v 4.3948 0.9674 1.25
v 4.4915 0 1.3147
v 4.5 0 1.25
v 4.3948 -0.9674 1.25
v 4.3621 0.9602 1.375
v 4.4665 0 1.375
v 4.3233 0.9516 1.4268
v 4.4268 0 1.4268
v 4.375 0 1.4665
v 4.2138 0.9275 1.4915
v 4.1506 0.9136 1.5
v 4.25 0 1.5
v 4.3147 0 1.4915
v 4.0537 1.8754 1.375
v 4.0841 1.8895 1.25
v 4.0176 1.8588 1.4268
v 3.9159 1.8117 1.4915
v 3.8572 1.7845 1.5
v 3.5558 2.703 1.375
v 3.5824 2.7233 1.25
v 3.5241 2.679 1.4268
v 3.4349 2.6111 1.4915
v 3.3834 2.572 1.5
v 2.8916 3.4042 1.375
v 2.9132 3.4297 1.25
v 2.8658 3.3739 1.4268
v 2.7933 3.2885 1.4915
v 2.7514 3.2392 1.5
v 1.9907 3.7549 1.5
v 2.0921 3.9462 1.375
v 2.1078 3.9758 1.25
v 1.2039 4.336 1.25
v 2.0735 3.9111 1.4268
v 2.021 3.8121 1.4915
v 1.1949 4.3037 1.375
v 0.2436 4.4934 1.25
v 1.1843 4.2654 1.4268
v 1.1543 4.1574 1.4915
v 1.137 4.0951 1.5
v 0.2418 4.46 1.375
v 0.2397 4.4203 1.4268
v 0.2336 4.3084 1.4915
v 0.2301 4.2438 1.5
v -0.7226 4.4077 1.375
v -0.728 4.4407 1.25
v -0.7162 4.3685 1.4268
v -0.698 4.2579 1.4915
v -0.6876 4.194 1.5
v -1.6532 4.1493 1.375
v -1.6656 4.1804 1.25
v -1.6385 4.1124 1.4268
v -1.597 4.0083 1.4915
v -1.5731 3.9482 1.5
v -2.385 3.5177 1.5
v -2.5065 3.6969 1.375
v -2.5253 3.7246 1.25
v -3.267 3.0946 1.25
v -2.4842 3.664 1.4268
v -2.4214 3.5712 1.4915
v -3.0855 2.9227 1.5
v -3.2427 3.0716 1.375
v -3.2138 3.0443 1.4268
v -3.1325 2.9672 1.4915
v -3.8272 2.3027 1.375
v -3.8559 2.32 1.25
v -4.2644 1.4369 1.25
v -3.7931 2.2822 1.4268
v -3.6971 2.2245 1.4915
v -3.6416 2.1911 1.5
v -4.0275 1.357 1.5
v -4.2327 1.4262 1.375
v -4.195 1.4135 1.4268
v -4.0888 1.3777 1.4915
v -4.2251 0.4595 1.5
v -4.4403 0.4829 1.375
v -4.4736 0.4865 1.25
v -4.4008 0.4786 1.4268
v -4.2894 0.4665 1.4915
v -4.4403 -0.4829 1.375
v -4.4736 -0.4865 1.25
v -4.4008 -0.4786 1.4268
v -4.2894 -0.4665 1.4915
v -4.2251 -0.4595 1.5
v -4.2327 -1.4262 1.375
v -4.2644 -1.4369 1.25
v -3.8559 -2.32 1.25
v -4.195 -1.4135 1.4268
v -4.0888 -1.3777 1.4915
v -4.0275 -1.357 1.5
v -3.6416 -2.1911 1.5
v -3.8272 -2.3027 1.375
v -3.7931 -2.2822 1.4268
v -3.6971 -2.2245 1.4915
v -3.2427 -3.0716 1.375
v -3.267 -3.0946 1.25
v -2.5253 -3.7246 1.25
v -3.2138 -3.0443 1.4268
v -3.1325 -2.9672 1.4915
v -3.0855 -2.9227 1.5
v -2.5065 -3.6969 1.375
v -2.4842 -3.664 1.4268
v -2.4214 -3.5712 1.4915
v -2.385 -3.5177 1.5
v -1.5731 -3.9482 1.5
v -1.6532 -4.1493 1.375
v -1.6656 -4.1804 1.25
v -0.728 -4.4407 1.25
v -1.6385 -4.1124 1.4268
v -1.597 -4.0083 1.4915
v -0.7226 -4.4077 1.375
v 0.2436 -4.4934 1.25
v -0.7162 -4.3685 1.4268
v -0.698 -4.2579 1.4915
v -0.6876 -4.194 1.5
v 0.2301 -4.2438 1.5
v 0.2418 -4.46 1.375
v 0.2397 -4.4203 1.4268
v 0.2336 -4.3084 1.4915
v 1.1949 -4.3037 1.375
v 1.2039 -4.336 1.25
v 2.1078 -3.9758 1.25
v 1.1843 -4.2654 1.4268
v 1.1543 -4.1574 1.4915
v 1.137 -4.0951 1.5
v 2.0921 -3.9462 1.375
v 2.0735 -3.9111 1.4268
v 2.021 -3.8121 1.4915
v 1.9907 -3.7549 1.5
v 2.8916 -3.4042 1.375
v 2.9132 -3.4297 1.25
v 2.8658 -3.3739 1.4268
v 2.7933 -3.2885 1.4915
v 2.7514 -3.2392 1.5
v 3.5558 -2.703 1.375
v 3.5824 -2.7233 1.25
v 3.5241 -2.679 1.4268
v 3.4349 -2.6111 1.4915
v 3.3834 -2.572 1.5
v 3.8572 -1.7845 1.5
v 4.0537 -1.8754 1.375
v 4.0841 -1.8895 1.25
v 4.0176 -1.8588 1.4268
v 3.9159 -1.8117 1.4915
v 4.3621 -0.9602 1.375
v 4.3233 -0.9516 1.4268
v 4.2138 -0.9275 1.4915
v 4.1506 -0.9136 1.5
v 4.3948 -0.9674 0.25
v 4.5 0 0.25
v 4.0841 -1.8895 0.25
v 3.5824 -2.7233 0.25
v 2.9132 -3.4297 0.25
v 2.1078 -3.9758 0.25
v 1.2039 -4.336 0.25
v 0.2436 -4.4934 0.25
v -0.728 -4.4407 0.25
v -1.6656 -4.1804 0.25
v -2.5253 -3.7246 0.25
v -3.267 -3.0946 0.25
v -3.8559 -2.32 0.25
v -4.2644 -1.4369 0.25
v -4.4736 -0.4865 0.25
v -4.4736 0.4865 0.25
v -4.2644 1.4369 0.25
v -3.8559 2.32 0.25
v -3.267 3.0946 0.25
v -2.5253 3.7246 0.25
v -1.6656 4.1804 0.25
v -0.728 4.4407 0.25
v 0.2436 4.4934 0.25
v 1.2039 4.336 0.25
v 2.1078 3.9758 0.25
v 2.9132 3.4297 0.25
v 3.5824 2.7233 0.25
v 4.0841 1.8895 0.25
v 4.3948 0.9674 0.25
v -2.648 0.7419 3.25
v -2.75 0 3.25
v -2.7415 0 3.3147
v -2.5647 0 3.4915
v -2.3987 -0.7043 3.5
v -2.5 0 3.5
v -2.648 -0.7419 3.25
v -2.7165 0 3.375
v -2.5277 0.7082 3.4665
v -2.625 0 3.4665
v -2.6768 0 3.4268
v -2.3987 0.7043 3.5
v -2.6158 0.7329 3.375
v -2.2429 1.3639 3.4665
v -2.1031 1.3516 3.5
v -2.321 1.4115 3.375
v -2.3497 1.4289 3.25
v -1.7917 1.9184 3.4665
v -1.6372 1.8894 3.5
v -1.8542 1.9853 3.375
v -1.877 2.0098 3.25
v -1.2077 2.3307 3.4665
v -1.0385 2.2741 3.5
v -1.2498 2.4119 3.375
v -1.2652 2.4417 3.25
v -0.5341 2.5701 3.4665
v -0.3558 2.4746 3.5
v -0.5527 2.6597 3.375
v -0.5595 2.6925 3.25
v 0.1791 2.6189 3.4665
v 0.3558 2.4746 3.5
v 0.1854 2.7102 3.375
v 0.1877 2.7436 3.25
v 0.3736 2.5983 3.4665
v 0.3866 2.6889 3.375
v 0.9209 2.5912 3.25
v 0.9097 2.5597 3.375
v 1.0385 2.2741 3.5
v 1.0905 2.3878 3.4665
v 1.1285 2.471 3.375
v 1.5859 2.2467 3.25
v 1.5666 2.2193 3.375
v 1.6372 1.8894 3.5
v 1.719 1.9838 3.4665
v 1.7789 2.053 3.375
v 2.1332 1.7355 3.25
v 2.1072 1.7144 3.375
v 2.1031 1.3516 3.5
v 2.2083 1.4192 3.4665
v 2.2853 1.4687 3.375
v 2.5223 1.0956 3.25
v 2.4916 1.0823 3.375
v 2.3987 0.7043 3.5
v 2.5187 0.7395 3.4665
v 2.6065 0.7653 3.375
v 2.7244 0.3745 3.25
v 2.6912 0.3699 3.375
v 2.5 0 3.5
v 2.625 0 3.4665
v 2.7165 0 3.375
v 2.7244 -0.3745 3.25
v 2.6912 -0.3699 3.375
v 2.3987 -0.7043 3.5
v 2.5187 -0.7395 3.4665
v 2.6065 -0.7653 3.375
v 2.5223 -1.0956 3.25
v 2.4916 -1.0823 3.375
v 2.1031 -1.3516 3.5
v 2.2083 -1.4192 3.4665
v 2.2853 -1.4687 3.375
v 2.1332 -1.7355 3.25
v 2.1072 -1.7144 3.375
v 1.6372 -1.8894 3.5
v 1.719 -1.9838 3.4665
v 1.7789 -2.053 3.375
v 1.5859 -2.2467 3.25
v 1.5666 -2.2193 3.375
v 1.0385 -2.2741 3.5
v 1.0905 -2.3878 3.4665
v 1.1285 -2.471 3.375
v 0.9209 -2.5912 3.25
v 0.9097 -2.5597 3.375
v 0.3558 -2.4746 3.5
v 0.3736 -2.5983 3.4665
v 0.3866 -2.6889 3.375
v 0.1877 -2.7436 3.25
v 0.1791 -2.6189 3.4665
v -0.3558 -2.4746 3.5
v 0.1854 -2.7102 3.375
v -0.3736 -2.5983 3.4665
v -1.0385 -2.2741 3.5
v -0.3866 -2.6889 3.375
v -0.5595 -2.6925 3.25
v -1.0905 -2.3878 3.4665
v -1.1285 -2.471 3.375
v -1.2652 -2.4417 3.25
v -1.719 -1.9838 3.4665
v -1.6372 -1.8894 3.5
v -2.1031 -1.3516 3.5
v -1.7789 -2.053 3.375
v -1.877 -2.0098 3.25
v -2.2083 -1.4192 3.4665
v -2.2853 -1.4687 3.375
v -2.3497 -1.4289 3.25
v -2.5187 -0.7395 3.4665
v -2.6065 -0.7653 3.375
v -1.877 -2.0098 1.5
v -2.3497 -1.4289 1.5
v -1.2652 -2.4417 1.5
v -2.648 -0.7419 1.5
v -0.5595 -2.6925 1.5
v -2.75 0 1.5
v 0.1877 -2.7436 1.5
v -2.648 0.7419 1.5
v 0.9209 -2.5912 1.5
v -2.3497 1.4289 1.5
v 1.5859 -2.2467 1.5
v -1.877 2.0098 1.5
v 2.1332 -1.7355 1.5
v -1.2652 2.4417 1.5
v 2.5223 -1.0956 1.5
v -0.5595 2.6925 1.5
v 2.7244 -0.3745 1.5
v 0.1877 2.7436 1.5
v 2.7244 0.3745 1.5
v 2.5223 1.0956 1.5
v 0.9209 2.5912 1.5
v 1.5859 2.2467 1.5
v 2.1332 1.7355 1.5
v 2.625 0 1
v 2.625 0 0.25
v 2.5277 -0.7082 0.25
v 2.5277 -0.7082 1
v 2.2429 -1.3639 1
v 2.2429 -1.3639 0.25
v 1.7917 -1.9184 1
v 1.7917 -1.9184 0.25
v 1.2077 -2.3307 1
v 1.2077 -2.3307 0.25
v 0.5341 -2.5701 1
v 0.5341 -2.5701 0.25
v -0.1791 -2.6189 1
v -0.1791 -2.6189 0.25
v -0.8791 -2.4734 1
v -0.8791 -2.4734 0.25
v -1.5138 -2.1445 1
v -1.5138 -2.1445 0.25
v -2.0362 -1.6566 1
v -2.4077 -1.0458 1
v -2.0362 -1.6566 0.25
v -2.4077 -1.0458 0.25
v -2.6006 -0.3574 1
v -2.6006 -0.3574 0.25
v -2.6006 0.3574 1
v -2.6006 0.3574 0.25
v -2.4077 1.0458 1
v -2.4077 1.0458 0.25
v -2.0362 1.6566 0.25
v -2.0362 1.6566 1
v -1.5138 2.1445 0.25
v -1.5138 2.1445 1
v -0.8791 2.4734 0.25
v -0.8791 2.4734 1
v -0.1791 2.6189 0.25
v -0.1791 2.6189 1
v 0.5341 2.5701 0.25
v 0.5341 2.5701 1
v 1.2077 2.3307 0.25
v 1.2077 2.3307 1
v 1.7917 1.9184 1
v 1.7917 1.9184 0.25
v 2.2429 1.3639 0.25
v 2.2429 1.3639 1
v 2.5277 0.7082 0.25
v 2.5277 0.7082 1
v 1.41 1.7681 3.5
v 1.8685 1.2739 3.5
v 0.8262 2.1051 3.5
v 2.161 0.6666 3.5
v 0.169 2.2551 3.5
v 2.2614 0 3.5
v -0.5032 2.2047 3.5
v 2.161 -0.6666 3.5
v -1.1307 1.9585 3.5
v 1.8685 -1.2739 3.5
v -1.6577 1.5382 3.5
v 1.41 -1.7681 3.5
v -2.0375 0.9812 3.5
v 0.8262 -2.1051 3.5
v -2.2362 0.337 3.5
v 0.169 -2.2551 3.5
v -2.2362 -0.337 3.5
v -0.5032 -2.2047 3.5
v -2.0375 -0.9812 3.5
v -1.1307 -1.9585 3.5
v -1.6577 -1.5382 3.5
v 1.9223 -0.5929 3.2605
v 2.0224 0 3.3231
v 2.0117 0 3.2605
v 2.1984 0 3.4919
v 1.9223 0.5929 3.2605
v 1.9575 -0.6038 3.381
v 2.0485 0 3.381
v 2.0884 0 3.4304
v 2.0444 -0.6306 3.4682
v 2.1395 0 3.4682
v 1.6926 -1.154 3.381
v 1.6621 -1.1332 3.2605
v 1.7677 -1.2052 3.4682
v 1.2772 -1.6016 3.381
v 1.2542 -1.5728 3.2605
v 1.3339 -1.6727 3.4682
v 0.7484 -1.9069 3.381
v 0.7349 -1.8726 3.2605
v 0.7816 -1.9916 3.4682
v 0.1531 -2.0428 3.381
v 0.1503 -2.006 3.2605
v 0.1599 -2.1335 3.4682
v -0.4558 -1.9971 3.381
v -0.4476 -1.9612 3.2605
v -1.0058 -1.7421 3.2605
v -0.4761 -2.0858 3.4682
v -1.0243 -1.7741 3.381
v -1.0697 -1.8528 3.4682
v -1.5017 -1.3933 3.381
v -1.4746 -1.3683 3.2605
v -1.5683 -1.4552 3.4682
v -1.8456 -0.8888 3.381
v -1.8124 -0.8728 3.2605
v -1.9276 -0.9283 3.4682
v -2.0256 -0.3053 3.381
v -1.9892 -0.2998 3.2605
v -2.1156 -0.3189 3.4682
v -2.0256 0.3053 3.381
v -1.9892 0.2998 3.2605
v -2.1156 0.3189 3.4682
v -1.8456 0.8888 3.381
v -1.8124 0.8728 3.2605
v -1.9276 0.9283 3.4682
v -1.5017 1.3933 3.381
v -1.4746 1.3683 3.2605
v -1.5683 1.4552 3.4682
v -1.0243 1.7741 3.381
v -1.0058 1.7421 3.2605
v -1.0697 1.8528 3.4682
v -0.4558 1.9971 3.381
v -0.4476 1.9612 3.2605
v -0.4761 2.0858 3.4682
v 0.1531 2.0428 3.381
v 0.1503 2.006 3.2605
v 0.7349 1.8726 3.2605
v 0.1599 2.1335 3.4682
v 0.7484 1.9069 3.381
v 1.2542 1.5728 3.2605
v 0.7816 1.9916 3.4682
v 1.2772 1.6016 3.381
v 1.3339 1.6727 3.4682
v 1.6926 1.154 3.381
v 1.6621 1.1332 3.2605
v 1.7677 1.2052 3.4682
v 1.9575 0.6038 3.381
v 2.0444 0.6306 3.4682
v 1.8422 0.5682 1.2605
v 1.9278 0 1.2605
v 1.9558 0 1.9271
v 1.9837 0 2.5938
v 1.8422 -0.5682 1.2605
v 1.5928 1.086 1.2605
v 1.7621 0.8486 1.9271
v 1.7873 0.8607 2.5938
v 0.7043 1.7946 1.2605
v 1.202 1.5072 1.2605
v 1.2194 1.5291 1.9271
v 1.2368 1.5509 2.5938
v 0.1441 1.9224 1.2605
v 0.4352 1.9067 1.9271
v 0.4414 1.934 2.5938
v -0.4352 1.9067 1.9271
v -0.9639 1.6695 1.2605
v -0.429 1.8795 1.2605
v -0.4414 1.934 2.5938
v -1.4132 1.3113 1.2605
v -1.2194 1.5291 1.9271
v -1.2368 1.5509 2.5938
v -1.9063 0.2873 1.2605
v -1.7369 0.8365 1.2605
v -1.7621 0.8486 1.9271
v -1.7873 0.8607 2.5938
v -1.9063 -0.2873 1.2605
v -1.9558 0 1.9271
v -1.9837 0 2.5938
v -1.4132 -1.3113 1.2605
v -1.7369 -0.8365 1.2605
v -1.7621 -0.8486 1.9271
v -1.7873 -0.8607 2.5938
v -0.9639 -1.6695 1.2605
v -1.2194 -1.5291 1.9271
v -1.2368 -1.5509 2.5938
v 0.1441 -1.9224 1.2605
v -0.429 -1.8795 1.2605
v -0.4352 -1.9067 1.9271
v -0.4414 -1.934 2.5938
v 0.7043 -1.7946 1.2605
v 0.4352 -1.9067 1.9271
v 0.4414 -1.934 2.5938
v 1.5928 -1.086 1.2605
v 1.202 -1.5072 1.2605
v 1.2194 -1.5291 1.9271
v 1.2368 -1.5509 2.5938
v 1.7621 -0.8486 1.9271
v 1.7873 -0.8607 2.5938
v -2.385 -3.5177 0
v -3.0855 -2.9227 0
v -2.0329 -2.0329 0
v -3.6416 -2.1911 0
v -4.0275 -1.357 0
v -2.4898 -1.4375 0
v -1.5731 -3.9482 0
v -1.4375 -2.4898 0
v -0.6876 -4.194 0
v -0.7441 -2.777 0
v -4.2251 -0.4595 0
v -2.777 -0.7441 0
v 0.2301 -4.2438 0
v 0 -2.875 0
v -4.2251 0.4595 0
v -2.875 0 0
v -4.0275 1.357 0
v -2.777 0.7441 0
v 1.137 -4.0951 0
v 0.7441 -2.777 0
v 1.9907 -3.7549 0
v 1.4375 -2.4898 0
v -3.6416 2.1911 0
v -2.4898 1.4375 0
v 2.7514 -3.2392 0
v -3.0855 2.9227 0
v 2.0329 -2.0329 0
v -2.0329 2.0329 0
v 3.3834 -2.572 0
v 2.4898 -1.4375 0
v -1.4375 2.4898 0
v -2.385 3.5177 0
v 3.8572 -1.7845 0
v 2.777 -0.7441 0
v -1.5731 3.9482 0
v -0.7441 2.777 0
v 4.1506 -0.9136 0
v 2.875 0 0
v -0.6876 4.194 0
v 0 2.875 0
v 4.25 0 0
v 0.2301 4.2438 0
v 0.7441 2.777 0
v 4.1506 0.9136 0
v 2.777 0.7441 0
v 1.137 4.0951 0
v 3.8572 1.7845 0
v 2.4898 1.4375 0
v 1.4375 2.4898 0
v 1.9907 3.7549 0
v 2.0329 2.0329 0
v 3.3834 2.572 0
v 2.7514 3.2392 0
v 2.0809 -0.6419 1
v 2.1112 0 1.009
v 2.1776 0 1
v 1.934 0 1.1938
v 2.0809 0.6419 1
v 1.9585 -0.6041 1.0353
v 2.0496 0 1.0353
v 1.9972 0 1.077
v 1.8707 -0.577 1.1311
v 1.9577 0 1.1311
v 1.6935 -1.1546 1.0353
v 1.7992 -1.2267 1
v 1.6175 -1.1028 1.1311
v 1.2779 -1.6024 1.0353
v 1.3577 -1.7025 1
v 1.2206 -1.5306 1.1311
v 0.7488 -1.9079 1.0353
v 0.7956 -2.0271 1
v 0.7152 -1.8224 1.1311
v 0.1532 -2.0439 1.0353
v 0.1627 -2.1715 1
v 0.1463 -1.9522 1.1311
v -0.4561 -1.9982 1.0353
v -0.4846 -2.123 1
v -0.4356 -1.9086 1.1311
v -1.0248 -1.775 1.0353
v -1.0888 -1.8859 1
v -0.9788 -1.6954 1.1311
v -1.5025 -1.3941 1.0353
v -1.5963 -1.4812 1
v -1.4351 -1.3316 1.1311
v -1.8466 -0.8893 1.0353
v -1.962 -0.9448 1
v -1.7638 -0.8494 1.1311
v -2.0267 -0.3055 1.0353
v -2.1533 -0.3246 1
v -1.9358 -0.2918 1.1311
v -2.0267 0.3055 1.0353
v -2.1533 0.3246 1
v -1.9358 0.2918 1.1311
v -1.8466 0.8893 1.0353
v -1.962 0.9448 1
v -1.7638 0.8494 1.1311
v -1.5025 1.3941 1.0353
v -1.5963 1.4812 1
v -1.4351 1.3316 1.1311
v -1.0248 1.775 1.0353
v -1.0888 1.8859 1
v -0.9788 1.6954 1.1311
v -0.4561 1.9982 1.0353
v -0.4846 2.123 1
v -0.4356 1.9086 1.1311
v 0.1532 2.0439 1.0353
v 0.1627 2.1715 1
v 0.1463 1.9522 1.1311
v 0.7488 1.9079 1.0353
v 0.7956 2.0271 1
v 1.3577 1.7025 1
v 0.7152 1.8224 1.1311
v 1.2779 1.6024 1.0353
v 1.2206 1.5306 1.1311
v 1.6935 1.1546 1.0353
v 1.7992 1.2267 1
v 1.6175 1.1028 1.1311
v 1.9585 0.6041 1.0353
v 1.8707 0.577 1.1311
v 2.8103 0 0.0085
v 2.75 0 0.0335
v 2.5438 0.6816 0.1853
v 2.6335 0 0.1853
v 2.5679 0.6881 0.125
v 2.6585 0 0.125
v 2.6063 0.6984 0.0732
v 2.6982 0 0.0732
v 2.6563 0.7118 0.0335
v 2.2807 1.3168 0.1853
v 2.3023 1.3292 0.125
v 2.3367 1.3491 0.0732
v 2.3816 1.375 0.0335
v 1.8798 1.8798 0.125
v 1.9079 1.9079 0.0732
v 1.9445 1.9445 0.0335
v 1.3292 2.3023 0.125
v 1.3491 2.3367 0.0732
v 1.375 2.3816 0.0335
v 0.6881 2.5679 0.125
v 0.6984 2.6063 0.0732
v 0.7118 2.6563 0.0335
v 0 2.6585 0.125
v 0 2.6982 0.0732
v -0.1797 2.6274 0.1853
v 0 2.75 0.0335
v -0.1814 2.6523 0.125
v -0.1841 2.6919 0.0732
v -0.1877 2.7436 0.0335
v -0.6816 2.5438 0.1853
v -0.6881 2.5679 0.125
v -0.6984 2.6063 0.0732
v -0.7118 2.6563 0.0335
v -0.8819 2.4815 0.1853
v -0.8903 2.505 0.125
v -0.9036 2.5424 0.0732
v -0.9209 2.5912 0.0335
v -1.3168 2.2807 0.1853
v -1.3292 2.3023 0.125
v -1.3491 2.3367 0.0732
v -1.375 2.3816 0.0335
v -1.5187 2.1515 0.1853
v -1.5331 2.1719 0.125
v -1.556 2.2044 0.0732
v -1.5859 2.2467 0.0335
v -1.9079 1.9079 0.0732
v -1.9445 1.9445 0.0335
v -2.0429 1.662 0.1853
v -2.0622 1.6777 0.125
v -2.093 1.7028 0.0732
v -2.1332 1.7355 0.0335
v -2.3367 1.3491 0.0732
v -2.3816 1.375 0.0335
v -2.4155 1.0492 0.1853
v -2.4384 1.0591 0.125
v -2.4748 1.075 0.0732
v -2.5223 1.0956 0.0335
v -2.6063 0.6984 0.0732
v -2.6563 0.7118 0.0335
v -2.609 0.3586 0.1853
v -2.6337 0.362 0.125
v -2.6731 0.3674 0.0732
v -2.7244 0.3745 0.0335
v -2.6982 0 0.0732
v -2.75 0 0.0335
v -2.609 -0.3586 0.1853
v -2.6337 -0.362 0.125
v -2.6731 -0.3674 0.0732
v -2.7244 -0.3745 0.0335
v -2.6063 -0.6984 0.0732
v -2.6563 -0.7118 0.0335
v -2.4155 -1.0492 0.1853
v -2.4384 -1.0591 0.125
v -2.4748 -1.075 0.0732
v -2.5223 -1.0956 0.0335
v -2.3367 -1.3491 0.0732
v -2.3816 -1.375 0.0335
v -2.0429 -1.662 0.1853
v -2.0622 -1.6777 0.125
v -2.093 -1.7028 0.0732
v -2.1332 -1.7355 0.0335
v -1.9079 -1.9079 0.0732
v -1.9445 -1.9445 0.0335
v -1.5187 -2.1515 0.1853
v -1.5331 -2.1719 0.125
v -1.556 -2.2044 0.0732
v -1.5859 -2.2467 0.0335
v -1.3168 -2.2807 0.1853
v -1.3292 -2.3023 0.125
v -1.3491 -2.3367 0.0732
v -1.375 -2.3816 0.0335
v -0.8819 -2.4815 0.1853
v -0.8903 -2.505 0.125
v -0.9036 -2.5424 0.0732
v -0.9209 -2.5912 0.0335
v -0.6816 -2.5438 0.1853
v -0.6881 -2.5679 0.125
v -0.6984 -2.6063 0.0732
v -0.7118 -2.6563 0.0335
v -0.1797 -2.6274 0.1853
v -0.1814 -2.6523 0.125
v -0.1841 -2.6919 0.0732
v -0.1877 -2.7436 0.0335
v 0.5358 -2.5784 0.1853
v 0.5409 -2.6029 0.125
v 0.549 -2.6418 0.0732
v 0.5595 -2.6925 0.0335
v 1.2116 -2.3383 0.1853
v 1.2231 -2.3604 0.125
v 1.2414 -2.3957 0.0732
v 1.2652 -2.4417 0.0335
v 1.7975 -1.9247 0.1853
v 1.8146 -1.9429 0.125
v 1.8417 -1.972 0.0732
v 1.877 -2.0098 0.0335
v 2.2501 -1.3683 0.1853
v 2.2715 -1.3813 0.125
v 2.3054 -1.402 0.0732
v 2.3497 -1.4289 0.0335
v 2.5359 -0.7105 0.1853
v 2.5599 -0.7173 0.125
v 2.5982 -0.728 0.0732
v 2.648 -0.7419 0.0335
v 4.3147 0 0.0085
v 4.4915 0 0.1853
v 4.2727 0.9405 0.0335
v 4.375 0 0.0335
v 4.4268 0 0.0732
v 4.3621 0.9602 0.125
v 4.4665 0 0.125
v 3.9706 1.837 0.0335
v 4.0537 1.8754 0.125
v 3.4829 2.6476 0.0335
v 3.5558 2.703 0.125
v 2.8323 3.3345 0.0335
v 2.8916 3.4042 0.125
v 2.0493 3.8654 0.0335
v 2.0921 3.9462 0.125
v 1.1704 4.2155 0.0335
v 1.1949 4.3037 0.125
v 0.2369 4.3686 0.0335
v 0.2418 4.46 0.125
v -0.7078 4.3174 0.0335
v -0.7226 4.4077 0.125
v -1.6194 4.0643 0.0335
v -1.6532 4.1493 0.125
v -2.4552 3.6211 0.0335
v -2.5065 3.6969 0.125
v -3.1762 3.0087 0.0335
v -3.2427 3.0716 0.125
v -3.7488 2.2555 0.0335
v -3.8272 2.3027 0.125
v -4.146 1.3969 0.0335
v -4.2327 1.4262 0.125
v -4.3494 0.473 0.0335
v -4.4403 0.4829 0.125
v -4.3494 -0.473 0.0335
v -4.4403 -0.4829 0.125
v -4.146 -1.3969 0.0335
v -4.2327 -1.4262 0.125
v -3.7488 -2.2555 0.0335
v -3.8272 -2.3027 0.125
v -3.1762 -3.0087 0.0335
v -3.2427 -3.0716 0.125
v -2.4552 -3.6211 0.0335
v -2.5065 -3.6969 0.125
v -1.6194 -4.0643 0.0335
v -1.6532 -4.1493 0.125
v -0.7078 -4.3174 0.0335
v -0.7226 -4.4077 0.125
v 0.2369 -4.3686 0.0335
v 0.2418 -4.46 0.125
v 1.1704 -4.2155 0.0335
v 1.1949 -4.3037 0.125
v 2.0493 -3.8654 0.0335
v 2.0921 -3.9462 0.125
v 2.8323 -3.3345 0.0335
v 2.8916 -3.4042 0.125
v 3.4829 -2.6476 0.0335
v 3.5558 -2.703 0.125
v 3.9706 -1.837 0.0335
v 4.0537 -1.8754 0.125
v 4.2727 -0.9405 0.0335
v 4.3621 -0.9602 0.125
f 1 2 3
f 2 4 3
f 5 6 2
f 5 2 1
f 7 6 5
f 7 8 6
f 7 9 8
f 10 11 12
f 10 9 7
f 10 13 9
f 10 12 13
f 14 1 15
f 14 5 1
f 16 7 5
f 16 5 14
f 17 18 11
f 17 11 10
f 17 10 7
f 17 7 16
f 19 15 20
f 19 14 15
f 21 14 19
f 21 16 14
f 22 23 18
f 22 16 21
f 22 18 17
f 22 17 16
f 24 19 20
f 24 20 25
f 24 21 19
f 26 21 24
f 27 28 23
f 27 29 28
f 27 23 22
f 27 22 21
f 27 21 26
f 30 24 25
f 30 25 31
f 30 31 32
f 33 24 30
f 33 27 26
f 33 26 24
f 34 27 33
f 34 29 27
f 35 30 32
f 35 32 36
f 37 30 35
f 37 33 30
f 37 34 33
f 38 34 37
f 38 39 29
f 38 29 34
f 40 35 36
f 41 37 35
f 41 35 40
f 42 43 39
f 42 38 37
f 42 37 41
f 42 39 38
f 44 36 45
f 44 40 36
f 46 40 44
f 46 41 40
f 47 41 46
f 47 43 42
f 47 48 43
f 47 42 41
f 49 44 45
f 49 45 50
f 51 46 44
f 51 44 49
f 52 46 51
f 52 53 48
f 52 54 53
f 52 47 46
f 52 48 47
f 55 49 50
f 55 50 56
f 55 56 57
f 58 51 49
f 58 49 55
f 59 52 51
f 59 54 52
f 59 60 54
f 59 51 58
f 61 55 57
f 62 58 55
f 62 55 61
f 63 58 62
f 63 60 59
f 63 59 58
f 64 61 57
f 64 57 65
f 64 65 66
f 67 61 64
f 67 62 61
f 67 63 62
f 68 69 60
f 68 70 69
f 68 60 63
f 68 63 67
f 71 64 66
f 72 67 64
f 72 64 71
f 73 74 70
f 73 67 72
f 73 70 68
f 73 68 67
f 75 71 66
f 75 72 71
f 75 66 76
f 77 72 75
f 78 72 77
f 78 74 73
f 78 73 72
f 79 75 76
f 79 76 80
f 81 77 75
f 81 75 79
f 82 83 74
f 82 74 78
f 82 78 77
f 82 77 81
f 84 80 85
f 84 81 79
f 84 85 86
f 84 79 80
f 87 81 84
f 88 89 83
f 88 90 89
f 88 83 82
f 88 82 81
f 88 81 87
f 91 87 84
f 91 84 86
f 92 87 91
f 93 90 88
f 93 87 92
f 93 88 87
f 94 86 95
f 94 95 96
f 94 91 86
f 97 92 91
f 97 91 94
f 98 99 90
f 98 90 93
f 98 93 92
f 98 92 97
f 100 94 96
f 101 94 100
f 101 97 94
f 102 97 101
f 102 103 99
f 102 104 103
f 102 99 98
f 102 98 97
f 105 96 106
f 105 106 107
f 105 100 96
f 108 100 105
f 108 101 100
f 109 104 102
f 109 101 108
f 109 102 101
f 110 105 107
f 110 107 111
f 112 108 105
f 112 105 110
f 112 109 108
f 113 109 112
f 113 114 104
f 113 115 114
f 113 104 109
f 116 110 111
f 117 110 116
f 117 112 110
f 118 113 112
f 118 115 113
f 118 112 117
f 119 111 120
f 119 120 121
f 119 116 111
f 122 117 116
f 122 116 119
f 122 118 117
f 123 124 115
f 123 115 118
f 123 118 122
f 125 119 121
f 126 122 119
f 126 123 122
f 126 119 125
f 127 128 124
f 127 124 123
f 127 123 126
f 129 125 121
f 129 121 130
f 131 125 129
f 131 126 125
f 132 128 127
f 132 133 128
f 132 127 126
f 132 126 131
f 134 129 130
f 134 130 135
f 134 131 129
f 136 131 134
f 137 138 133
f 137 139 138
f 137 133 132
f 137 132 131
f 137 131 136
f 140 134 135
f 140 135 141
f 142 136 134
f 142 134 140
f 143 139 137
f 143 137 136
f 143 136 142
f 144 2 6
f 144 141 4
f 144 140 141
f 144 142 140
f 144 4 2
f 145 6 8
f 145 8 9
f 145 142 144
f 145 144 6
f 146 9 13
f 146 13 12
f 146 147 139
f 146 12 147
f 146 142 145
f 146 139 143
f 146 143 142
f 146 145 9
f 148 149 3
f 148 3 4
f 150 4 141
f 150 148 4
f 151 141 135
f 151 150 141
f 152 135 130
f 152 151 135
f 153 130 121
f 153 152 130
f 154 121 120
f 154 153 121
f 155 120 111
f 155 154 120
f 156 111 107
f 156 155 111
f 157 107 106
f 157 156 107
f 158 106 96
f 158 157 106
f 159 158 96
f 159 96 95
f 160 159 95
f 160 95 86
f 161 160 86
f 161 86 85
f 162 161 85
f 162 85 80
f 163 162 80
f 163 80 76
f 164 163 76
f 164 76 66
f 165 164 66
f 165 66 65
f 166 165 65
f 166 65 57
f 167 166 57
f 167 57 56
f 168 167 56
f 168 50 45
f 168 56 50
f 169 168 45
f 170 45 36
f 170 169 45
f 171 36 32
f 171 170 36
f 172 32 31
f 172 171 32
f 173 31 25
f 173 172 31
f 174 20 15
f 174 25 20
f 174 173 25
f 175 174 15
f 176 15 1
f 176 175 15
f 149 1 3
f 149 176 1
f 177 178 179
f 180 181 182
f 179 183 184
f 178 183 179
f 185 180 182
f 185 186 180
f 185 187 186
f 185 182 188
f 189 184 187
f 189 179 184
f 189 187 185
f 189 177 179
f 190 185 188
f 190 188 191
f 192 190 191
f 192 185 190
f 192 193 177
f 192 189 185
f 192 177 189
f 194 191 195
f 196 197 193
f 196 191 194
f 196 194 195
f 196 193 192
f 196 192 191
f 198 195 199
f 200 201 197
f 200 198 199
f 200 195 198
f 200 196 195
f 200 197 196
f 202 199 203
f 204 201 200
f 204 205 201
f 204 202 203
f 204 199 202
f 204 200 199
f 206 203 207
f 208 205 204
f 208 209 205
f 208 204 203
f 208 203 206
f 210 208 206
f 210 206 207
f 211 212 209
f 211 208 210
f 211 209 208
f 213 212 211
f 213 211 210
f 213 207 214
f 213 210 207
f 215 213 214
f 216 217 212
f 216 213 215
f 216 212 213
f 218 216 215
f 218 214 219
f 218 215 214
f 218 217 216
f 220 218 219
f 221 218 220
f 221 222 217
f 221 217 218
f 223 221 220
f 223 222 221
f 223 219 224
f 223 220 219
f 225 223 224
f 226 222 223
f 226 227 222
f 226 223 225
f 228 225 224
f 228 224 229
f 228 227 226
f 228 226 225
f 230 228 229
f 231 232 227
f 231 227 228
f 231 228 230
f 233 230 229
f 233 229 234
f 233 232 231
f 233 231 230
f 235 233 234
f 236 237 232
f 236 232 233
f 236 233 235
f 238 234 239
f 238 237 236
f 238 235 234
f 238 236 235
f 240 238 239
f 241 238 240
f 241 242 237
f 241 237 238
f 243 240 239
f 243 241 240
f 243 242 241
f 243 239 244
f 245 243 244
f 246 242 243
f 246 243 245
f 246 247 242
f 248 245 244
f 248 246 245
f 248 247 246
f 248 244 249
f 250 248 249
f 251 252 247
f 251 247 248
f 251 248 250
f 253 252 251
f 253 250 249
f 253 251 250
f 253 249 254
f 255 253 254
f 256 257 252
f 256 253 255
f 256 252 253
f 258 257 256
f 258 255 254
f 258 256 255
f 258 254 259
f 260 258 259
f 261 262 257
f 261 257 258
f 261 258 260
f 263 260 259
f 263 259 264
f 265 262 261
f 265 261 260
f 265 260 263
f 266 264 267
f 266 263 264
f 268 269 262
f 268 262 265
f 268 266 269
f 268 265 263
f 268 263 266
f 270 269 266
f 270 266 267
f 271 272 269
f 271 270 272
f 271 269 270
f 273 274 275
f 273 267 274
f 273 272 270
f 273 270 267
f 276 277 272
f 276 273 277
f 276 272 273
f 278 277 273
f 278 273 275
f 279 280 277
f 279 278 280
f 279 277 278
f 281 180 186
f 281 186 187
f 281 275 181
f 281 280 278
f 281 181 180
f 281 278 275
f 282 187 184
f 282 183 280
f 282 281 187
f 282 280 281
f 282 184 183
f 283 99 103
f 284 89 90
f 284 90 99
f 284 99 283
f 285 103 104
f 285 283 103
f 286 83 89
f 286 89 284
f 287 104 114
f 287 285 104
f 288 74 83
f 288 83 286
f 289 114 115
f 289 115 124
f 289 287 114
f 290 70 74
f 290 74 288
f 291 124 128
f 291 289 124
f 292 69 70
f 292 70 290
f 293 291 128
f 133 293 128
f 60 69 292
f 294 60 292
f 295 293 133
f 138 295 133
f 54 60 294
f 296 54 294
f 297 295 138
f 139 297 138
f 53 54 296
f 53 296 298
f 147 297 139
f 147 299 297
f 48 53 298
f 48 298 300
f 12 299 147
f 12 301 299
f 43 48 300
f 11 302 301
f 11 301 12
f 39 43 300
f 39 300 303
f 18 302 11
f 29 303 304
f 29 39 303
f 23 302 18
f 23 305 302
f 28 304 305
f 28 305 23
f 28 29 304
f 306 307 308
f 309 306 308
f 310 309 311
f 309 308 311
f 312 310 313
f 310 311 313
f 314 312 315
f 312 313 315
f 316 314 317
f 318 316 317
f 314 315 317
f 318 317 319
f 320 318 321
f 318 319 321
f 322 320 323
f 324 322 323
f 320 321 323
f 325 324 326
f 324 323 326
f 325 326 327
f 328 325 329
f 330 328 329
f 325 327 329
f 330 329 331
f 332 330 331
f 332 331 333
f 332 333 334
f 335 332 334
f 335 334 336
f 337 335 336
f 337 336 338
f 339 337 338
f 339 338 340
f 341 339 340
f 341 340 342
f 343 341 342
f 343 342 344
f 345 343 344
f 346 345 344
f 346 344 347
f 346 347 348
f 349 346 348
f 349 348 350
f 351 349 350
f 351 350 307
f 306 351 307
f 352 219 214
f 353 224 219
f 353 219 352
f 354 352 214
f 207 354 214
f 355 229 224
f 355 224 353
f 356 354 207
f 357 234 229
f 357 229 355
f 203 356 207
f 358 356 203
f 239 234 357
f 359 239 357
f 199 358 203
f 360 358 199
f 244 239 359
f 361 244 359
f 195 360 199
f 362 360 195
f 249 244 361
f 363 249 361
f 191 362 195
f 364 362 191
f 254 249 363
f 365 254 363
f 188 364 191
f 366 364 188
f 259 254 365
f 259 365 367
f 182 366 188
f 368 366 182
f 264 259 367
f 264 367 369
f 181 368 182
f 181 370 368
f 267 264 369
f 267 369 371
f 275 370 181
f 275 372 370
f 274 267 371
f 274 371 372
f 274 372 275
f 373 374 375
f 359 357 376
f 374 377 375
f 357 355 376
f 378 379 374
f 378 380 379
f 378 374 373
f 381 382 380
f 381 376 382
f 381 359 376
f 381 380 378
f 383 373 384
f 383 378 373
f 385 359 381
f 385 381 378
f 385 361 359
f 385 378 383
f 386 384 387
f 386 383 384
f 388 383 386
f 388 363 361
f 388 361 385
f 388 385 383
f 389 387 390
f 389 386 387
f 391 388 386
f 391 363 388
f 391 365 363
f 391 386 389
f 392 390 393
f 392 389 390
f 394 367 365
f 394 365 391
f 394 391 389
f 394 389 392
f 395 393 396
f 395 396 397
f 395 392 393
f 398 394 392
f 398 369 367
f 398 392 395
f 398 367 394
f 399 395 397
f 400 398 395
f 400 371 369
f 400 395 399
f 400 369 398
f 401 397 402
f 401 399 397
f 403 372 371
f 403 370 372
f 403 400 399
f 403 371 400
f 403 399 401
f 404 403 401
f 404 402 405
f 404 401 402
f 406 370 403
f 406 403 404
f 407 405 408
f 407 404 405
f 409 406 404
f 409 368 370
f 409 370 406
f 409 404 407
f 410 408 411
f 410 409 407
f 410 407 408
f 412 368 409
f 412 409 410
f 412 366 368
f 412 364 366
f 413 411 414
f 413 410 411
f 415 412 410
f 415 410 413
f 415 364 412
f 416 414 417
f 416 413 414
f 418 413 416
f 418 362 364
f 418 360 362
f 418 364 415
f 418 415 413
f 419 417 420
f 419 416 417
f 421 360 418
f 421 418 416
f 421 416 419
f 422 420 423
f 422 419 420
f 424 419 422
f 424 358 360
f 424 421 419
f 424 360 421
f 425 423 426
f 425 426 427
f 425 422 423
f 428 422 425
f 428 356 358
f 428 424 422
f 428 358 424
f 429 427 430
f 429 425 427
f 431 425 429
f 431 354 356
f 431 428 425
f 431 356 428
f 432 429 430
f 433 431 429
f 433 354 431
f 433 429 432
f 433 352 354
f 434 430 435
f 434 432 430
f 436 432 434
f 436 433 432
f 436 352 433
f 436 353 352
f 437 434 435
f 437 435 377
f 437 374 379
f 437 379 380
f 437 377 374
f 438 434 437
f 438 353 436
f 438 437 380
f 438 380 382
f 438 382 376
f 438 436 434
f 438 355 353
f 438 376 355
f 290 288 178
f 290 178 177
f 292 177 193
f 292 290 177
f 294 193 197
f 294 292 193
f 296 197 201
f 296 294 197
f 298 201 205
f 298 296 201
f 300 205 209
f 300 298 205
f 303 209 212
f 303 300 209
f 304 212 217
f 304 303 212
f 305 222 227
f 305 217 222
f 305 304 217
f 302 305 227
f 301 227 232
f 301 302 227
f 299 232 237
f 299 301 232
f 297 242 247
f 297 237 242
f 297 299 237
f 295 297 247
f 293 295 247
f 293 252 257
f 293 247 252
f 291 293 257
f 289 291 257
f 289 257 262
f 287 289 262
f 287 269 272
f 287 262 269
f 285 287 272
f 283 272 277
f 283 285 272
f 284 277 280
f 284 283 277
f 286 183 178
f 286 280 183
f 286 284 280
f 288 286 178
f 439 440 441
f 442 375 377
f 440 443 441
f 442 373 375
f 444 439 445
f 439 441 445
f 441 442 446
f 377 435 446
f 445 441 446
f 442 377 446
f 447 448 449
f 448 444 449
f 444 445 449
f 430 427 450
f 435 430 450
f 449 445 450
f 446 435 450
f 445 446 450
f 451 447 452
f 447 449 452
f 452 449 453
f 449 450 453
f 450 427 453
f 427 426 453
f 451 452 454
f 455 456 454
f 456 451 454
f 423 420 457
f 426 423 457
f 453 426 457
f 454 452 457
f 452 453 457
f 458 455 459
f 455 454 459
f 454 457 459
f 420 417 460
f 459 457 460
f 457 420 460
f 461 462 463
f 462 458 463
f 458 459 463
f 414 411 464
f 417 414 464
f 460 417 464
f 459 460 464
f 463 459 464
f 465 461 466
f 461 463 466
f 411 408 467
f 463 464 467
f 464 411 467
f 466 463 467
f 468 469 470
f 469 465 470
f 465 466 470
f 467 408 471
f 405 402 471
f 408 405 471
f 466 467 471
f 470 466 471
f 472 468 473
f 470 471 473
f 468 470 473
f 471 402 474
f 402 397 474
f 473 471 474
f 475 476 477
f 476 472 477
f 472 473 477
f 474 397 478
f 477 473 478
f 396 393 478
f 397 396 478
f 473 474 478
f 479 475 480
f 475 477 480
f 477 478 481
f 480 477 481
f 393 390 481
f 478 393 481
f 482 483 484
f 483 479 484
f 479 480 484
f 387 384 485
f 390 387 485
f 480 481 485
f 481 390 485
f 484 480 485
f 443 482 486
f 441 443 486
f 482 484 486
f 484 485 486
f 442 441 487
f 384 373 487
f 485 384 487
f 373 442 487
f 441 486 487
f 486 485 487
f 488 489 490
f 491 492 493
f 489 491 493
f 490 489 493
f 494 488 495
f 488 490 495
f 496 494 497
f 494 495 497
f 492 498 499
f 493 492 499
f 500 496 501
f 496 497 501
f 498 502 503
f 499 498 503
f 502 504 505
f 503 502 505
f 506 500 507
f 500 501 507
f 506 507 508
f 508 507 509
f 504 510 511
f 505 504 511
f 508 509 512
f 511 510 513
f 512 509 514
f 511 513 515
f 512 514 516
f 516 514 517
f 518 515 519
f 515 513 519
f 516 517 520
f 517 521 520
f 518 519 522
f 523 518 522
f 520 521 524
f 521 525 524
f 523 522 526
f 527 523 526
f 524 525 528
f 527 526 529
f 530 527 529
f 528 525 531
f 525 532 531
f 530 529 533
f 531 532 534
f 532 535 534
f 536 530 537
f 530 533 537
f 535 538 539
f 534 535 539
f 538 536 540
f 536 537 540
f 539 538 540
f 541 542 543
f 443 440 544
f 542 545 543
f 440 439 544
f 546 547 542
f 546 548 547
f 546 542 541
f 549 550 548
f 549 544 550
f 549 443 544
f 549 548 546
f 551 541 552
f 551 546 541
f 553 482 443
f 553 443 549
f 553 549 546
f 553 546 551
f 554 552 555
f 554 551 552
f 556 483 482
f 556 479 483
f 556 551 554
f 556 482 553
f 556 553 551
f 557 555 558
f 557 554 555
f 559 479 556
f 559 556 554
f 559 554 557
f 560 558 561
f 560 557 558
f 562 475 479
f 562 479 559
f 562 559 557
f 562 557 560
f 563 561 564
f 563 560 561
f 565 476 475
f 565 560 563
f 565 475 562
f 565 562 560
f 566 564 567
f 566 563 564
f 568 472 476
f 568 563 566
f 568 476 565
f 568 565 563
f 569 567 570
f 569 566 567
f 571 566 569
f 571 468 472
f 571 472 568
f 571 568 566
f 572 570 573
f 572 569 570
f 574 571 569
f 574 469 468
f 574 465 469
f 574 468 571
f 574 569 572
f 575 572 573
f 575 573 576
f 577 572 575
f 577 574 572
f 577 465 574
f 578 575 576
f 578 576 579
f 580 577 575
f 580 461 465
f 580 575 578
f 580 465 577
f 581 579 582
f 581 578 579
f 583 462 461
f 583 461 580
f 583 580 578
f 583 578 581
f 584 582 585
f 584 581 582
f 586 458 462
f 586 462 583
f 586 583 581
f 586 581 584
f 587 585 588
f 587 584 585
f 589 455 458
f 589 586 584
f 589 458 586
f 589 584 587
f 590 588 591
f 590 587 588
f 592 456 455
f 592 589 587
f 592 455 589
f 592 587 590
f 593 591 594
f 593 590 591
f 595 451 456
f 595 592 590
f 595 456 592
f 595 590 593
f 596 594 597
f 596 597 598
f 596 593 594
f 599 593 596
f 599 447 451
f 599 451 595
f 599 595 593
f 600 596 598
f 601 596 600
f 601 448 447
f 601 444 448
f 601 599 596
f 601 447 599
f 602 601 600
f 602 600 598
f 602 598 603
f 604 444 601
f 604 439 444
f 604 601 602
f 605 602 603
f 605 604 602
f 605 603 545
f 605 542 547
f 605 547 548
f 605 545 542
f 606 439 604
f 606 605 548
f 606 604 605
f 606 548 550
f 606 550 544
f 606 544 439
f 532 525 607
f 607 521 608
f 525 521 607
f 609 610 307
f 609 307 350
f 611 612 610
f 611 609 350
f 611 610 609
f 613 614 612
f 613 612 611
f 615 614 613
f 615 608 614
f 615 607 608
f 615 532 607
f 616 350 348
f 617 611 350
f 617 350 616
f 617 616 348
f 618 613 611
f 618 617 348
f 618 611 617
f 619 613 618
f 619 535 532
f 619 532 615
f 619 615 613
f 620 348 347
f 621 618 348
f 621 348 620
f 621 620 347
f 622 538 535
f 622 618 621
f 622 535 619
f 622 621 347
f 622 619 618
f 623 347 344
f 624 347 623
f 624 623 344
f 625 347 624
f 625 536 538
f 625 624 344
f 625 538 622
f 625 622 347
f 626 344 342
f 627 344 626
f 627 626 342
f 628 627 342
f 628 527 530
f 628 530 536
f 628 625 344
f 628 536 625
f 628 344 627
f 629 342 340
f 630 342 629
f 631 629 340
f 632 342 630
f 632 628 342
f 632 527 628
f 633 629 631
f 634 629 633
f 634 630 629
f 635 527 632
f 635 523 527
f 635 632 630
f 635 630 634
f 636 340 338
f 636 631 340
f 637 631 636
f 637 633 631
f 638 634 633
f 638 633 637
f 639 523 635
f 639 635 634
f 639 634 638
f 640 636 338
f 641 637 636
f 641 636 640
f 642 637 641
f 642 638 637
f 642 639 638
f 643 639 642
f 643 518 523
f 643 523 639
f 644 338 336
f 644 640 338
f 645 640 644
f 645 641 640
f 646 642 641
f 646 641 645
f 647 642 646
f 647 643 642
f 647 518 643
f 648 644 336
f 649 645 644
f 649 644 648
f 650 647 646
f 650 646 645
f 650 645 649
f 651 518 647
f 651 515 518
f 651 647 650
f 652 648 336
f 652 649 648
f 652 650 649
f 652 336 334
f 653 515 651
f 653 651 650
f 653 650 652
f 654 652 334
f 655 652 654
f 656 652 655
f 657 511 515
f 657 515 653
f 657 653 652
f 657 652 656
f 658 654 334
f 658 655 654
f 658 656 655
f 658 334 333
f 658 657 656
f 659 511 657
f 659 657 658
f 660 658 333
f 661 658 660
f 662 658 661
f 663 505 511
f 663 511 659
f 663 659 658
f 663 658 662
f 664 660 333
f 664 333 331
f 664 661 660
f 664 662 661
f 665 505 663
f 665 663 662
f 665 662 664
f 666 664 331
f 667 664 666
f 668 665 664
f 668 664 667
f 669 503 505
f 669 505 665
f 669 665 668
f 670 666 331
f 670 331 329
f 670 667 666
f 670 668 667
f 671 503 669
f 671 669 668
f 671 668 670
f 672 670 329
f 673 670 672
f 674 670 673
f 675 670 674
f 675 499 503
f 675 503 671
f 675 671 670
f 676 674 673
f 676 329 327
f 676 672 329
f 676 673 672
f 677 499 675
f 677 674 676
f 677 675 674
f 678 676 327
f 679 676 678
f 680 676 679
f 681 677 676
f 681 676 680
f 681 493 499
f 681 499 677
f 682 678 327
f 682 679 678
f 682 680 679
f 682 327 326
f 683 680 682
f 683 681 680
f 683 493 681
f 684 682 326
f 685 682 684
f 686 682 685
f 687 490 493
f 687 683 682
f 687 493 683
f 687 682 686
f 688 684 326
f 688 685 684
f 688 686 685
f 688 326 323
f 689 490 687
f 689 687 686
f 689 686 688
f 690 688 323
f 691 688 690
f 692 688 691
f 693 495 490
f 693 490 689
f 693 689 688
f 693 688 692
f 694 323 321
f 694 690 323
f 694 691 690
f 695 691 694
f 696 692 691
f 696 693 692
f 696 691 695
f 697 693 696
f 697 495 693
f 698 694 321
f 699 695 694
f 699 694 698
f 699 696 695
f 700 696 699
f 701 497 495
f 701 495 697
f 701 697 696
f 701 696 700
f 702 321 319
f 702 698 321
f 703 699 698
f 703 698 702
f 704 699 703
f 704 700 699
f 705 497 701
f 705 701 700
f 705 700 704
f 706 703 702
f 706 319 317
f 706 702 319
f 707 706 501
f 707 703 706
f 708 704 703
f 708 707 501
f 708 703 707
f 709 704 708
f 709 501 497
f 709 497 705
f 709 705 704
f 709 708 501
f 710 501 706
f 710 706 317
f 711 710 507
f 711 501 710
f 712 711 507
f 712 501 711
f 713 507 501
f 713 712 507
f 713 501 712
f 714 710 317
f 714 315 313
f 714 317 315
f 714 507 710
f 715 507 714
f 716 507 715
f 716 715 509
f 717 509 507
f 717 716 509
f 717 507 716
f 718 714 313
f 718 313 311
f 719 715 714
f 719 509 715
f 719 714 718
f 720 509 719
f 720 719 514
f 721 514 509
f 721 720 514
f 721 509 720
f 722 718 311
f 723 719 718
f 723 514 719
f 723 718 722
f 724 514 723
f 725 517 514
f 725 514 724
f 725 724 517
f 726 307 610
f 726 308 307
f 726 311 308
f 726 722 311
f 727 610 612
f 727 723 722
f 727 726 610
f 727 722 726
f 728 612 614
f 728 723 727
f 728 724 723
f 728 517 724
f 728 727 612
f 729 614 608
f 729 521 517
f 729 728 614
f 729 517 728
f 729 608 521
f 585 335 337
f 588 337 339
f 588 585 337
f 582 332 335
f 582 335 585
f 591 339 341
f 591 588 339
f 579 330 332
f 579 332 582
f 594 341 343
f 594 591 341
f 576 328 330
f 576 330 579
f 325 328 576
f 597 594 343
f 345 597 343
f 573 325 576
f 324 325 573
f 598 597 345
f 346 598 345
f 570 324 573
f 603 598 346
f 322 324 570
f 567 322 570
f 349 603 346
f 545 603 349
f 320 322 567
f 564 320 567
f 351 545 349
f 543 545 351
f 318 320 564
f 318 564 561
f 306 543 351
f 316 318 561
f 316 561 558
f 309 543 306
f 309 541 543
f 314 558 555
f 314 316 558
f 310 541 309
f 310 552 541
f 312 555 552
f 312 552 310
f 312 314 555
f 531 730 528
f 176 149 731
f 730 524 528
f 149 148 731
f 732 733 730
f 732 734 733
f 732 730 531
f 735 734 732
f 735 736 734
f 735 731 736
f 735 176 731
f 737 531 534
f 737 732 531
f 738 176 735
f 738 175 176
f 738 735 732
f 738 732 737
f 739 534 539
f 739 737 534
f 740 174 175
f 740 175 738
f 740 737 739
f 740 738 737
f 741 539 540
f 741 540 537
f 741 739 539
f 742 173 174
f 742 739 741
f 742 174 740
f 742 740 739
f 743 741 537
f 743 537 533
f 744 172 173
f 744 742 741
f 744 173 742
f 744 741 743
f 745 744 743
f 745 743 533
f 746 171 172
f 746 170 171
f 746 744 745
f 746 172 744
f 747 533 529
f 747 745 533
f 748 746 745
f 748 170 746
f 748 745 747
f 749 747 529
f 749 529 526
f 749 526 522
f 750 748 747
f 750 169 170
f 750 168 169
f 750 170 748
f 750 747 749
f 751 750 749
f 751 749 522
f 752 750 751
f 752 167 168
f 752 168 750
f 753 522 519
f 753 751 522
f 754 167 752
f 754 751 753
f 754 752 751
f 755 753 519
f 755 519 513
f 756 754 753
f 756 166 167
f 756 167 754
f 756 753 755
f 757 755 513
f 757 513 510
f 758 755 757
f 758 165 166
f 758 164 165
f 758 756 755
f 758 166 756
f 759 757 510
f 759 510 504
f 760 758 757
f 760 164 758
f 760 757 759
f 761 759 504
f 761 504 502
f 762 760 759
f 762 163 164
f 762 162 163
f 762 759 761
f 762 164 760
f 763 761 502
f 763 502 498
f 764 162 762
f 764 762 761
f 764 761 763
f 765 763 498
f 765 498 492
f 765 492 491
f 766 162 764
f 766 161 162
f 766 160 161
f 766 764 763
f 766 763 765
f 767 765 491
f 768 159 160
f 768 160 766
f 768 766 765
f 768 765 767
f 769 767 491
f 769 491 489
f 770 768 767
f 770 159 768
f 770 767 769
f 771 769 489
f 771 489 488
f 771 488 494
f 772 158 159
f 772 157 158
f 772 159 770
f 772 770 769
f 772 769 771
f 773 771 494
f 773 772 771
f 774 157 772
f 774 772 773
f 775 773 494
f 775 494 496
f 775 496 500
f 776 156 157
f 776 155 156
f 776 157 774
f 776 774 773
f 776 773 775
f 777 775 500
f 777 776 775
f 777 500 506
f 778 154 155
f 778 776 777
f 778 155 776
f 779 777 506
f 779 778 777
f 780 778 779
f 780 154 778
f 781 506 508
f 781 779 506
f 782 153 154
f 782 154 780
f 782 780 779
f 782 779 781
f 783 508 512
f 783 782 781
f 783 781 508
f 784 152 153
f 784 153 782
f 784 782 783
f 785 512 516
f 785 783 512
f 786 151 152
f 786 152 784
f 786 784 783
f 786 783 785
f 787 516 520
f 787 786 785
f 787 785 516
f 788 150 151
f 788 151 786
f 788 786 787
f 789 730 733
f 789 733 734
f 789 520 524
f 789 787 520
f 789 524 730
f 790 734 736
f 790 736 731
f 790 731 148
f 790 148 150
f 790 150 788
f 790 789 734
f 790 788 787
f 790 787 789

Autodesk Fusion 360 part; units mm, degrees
sketch "Sketch1" plane through (0, 0, 0) normal (0, 0, 1) x (1, 0, 0)
  circle A0 centre (0, 0) radius 4.5
  dimension "d1" = 9
extrude "Extrude1" add sketch "Sketch1" along normal blind 1.5
sketch "Sketch2" plane through (0, 0, 1.5) normal (0, 0, 1) x (-1, 0, 0)
  circle A0 centre (0, 0) radius 4.5
  circle A1 centre (0, 0) radius 2.75
  circle A2 centre (0, 0) radius 4.5
  circle A3 centre (0, 0) radius 1.875
  circle A4 centre (0, 0) radius 4.5
  dimension "d4" = 5.5
extrude "Extrude2" add sketch "Sketch2" along normal blind 2 contours A1 | A3
sketch "Sketch3" plane through (0, 0, 0) normal (0, 0, -1) x (1, 0, 0)
  circle A0 centre (0, 0) radius 4.5
  circle A1 centre (0, 0) radius 1.875
  dimension "d7" = 3.75
extrude "Extrude3" cut sketch "Sketch3" against normal blind 4 draft 2.4 contours A1
sketch "Sketch4" plane through (0, 0, 0) normal (0, 0, -1) x (1, 0, 0)
  circle A0 centre (0, 0) radius 1.875
  circle A1 centre (0, 0) radius 4.5
  circle A2 centre (0, 0) radius 2.625
  dimension "d10" = 5.25
extrude "Extrude4" cut sketch "Sketch4" against normal blind 1 contours A2
fillet "Fillet1" radius 0.25 1 edges at (-1.7872, 0.6932, 1)
fillet "Fillet2" radius 0.25 1 edges at (-2.4474, -0.9492, 0)
fillet "Fillet3" radius 0.25 4 edges at (-4.1955, -1.6273, 1.5) (-4.1955, -1.6273, 0) (2.5639, 0.9944, 3.5) (-1.8849, 0.7311, 3.5)
